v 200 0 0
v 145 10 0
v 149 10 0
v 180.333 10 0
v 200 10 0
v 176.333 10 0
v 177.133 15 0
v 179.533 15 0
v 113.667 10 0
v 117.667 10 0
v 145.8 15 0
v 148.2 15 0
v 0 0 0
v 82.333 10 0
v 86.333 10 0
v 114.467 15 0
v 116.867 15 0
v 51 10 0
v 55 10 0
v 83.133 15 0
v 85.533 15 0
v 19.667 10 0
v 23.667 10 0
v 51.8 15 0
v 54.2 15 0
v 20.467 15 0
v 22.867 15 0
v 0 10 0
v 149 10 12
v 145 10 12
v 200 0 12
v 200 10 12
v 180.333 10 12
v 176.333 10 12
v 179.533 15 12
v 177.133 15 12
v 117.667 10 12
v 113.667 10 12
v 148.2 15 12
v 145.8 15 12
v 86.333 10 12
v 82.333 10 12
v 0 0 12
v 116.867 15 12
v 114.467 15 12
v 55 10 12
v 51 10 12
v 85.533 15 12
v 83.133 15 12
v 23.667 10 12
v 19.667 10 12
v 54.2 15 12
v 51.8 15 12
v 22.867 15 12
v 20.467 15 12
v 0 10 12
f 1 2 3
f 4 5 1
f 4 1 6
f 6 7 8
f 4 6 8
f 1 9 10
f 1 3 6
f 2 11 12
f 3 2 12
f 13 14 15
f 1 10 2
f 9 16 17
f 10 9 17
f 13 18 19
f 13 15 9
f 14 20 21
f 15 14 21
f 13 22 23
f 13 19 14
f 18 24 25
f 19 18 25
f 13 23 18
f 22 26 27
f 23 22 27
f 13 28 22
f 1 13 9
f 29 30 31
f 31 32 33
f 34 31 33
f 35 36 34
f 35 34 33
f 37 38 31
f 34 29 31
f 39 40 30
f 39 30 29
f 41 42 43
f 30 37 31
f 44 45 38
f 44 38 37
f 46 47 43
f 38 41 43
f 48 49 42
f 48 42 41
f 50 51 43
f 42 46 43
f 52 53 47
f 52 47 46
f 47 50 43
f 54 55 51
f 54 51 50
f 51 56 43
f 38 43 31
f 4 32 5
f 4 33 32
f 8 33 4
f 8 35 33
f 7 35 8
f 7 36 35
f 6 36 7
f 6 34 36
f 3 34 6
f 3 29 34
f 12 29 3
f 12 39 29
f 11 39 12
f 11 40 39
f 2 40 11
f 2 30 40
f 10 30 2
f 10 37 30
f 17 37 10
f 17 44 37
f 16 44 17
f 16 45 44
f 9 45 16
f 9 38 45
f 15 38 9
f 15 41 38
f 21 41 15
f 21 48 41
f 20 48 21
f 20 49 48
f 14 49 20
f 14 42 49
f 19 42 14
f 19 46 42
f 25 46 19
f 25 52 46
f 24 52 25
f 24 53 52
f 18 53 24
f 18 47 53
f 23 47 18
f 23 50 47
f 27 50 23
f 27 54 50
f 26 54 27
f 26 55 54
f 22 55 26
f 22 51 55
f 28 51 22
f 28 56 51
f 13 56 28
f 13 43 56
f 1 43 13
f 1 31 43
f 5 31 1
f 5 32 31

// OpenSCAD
$fn = 32;

// ----------------------------------------------------------------------
// Gear rack: 6 teeth on a 200 mm bar, pitch 31.33 mm
// ----------------------------------------------------------------------

// --- parameters (mm) ---
profile_height = 12;      // extrusion height
profile_points = 28;      // points of the closed outline

profile = [[0, 0], [200, 0], [200, 10], [180.333, 10], [179.533, 15], [177.133, 15], [176.333, 10], [149, 10], [148.2, 15], [145.8, 15], [145, 10], [117.667, 10], [116.867, 15], [114.467, 15], [113.667, 10], [86.333, 10], [85.533, 15], [83.133, 15], [82.333, 10], [55, 10], [54.2, 15], [51.8, 15], [51, 10], [23.667, 10], [22.867, 15], [20.467, 15], [19.667, 10], [0, 10]];  // single closed polygon, 28 points, counter clockwise

// --- the one profile operation ---
linear_extrude(height = profile_height) polygon(points = profile);
